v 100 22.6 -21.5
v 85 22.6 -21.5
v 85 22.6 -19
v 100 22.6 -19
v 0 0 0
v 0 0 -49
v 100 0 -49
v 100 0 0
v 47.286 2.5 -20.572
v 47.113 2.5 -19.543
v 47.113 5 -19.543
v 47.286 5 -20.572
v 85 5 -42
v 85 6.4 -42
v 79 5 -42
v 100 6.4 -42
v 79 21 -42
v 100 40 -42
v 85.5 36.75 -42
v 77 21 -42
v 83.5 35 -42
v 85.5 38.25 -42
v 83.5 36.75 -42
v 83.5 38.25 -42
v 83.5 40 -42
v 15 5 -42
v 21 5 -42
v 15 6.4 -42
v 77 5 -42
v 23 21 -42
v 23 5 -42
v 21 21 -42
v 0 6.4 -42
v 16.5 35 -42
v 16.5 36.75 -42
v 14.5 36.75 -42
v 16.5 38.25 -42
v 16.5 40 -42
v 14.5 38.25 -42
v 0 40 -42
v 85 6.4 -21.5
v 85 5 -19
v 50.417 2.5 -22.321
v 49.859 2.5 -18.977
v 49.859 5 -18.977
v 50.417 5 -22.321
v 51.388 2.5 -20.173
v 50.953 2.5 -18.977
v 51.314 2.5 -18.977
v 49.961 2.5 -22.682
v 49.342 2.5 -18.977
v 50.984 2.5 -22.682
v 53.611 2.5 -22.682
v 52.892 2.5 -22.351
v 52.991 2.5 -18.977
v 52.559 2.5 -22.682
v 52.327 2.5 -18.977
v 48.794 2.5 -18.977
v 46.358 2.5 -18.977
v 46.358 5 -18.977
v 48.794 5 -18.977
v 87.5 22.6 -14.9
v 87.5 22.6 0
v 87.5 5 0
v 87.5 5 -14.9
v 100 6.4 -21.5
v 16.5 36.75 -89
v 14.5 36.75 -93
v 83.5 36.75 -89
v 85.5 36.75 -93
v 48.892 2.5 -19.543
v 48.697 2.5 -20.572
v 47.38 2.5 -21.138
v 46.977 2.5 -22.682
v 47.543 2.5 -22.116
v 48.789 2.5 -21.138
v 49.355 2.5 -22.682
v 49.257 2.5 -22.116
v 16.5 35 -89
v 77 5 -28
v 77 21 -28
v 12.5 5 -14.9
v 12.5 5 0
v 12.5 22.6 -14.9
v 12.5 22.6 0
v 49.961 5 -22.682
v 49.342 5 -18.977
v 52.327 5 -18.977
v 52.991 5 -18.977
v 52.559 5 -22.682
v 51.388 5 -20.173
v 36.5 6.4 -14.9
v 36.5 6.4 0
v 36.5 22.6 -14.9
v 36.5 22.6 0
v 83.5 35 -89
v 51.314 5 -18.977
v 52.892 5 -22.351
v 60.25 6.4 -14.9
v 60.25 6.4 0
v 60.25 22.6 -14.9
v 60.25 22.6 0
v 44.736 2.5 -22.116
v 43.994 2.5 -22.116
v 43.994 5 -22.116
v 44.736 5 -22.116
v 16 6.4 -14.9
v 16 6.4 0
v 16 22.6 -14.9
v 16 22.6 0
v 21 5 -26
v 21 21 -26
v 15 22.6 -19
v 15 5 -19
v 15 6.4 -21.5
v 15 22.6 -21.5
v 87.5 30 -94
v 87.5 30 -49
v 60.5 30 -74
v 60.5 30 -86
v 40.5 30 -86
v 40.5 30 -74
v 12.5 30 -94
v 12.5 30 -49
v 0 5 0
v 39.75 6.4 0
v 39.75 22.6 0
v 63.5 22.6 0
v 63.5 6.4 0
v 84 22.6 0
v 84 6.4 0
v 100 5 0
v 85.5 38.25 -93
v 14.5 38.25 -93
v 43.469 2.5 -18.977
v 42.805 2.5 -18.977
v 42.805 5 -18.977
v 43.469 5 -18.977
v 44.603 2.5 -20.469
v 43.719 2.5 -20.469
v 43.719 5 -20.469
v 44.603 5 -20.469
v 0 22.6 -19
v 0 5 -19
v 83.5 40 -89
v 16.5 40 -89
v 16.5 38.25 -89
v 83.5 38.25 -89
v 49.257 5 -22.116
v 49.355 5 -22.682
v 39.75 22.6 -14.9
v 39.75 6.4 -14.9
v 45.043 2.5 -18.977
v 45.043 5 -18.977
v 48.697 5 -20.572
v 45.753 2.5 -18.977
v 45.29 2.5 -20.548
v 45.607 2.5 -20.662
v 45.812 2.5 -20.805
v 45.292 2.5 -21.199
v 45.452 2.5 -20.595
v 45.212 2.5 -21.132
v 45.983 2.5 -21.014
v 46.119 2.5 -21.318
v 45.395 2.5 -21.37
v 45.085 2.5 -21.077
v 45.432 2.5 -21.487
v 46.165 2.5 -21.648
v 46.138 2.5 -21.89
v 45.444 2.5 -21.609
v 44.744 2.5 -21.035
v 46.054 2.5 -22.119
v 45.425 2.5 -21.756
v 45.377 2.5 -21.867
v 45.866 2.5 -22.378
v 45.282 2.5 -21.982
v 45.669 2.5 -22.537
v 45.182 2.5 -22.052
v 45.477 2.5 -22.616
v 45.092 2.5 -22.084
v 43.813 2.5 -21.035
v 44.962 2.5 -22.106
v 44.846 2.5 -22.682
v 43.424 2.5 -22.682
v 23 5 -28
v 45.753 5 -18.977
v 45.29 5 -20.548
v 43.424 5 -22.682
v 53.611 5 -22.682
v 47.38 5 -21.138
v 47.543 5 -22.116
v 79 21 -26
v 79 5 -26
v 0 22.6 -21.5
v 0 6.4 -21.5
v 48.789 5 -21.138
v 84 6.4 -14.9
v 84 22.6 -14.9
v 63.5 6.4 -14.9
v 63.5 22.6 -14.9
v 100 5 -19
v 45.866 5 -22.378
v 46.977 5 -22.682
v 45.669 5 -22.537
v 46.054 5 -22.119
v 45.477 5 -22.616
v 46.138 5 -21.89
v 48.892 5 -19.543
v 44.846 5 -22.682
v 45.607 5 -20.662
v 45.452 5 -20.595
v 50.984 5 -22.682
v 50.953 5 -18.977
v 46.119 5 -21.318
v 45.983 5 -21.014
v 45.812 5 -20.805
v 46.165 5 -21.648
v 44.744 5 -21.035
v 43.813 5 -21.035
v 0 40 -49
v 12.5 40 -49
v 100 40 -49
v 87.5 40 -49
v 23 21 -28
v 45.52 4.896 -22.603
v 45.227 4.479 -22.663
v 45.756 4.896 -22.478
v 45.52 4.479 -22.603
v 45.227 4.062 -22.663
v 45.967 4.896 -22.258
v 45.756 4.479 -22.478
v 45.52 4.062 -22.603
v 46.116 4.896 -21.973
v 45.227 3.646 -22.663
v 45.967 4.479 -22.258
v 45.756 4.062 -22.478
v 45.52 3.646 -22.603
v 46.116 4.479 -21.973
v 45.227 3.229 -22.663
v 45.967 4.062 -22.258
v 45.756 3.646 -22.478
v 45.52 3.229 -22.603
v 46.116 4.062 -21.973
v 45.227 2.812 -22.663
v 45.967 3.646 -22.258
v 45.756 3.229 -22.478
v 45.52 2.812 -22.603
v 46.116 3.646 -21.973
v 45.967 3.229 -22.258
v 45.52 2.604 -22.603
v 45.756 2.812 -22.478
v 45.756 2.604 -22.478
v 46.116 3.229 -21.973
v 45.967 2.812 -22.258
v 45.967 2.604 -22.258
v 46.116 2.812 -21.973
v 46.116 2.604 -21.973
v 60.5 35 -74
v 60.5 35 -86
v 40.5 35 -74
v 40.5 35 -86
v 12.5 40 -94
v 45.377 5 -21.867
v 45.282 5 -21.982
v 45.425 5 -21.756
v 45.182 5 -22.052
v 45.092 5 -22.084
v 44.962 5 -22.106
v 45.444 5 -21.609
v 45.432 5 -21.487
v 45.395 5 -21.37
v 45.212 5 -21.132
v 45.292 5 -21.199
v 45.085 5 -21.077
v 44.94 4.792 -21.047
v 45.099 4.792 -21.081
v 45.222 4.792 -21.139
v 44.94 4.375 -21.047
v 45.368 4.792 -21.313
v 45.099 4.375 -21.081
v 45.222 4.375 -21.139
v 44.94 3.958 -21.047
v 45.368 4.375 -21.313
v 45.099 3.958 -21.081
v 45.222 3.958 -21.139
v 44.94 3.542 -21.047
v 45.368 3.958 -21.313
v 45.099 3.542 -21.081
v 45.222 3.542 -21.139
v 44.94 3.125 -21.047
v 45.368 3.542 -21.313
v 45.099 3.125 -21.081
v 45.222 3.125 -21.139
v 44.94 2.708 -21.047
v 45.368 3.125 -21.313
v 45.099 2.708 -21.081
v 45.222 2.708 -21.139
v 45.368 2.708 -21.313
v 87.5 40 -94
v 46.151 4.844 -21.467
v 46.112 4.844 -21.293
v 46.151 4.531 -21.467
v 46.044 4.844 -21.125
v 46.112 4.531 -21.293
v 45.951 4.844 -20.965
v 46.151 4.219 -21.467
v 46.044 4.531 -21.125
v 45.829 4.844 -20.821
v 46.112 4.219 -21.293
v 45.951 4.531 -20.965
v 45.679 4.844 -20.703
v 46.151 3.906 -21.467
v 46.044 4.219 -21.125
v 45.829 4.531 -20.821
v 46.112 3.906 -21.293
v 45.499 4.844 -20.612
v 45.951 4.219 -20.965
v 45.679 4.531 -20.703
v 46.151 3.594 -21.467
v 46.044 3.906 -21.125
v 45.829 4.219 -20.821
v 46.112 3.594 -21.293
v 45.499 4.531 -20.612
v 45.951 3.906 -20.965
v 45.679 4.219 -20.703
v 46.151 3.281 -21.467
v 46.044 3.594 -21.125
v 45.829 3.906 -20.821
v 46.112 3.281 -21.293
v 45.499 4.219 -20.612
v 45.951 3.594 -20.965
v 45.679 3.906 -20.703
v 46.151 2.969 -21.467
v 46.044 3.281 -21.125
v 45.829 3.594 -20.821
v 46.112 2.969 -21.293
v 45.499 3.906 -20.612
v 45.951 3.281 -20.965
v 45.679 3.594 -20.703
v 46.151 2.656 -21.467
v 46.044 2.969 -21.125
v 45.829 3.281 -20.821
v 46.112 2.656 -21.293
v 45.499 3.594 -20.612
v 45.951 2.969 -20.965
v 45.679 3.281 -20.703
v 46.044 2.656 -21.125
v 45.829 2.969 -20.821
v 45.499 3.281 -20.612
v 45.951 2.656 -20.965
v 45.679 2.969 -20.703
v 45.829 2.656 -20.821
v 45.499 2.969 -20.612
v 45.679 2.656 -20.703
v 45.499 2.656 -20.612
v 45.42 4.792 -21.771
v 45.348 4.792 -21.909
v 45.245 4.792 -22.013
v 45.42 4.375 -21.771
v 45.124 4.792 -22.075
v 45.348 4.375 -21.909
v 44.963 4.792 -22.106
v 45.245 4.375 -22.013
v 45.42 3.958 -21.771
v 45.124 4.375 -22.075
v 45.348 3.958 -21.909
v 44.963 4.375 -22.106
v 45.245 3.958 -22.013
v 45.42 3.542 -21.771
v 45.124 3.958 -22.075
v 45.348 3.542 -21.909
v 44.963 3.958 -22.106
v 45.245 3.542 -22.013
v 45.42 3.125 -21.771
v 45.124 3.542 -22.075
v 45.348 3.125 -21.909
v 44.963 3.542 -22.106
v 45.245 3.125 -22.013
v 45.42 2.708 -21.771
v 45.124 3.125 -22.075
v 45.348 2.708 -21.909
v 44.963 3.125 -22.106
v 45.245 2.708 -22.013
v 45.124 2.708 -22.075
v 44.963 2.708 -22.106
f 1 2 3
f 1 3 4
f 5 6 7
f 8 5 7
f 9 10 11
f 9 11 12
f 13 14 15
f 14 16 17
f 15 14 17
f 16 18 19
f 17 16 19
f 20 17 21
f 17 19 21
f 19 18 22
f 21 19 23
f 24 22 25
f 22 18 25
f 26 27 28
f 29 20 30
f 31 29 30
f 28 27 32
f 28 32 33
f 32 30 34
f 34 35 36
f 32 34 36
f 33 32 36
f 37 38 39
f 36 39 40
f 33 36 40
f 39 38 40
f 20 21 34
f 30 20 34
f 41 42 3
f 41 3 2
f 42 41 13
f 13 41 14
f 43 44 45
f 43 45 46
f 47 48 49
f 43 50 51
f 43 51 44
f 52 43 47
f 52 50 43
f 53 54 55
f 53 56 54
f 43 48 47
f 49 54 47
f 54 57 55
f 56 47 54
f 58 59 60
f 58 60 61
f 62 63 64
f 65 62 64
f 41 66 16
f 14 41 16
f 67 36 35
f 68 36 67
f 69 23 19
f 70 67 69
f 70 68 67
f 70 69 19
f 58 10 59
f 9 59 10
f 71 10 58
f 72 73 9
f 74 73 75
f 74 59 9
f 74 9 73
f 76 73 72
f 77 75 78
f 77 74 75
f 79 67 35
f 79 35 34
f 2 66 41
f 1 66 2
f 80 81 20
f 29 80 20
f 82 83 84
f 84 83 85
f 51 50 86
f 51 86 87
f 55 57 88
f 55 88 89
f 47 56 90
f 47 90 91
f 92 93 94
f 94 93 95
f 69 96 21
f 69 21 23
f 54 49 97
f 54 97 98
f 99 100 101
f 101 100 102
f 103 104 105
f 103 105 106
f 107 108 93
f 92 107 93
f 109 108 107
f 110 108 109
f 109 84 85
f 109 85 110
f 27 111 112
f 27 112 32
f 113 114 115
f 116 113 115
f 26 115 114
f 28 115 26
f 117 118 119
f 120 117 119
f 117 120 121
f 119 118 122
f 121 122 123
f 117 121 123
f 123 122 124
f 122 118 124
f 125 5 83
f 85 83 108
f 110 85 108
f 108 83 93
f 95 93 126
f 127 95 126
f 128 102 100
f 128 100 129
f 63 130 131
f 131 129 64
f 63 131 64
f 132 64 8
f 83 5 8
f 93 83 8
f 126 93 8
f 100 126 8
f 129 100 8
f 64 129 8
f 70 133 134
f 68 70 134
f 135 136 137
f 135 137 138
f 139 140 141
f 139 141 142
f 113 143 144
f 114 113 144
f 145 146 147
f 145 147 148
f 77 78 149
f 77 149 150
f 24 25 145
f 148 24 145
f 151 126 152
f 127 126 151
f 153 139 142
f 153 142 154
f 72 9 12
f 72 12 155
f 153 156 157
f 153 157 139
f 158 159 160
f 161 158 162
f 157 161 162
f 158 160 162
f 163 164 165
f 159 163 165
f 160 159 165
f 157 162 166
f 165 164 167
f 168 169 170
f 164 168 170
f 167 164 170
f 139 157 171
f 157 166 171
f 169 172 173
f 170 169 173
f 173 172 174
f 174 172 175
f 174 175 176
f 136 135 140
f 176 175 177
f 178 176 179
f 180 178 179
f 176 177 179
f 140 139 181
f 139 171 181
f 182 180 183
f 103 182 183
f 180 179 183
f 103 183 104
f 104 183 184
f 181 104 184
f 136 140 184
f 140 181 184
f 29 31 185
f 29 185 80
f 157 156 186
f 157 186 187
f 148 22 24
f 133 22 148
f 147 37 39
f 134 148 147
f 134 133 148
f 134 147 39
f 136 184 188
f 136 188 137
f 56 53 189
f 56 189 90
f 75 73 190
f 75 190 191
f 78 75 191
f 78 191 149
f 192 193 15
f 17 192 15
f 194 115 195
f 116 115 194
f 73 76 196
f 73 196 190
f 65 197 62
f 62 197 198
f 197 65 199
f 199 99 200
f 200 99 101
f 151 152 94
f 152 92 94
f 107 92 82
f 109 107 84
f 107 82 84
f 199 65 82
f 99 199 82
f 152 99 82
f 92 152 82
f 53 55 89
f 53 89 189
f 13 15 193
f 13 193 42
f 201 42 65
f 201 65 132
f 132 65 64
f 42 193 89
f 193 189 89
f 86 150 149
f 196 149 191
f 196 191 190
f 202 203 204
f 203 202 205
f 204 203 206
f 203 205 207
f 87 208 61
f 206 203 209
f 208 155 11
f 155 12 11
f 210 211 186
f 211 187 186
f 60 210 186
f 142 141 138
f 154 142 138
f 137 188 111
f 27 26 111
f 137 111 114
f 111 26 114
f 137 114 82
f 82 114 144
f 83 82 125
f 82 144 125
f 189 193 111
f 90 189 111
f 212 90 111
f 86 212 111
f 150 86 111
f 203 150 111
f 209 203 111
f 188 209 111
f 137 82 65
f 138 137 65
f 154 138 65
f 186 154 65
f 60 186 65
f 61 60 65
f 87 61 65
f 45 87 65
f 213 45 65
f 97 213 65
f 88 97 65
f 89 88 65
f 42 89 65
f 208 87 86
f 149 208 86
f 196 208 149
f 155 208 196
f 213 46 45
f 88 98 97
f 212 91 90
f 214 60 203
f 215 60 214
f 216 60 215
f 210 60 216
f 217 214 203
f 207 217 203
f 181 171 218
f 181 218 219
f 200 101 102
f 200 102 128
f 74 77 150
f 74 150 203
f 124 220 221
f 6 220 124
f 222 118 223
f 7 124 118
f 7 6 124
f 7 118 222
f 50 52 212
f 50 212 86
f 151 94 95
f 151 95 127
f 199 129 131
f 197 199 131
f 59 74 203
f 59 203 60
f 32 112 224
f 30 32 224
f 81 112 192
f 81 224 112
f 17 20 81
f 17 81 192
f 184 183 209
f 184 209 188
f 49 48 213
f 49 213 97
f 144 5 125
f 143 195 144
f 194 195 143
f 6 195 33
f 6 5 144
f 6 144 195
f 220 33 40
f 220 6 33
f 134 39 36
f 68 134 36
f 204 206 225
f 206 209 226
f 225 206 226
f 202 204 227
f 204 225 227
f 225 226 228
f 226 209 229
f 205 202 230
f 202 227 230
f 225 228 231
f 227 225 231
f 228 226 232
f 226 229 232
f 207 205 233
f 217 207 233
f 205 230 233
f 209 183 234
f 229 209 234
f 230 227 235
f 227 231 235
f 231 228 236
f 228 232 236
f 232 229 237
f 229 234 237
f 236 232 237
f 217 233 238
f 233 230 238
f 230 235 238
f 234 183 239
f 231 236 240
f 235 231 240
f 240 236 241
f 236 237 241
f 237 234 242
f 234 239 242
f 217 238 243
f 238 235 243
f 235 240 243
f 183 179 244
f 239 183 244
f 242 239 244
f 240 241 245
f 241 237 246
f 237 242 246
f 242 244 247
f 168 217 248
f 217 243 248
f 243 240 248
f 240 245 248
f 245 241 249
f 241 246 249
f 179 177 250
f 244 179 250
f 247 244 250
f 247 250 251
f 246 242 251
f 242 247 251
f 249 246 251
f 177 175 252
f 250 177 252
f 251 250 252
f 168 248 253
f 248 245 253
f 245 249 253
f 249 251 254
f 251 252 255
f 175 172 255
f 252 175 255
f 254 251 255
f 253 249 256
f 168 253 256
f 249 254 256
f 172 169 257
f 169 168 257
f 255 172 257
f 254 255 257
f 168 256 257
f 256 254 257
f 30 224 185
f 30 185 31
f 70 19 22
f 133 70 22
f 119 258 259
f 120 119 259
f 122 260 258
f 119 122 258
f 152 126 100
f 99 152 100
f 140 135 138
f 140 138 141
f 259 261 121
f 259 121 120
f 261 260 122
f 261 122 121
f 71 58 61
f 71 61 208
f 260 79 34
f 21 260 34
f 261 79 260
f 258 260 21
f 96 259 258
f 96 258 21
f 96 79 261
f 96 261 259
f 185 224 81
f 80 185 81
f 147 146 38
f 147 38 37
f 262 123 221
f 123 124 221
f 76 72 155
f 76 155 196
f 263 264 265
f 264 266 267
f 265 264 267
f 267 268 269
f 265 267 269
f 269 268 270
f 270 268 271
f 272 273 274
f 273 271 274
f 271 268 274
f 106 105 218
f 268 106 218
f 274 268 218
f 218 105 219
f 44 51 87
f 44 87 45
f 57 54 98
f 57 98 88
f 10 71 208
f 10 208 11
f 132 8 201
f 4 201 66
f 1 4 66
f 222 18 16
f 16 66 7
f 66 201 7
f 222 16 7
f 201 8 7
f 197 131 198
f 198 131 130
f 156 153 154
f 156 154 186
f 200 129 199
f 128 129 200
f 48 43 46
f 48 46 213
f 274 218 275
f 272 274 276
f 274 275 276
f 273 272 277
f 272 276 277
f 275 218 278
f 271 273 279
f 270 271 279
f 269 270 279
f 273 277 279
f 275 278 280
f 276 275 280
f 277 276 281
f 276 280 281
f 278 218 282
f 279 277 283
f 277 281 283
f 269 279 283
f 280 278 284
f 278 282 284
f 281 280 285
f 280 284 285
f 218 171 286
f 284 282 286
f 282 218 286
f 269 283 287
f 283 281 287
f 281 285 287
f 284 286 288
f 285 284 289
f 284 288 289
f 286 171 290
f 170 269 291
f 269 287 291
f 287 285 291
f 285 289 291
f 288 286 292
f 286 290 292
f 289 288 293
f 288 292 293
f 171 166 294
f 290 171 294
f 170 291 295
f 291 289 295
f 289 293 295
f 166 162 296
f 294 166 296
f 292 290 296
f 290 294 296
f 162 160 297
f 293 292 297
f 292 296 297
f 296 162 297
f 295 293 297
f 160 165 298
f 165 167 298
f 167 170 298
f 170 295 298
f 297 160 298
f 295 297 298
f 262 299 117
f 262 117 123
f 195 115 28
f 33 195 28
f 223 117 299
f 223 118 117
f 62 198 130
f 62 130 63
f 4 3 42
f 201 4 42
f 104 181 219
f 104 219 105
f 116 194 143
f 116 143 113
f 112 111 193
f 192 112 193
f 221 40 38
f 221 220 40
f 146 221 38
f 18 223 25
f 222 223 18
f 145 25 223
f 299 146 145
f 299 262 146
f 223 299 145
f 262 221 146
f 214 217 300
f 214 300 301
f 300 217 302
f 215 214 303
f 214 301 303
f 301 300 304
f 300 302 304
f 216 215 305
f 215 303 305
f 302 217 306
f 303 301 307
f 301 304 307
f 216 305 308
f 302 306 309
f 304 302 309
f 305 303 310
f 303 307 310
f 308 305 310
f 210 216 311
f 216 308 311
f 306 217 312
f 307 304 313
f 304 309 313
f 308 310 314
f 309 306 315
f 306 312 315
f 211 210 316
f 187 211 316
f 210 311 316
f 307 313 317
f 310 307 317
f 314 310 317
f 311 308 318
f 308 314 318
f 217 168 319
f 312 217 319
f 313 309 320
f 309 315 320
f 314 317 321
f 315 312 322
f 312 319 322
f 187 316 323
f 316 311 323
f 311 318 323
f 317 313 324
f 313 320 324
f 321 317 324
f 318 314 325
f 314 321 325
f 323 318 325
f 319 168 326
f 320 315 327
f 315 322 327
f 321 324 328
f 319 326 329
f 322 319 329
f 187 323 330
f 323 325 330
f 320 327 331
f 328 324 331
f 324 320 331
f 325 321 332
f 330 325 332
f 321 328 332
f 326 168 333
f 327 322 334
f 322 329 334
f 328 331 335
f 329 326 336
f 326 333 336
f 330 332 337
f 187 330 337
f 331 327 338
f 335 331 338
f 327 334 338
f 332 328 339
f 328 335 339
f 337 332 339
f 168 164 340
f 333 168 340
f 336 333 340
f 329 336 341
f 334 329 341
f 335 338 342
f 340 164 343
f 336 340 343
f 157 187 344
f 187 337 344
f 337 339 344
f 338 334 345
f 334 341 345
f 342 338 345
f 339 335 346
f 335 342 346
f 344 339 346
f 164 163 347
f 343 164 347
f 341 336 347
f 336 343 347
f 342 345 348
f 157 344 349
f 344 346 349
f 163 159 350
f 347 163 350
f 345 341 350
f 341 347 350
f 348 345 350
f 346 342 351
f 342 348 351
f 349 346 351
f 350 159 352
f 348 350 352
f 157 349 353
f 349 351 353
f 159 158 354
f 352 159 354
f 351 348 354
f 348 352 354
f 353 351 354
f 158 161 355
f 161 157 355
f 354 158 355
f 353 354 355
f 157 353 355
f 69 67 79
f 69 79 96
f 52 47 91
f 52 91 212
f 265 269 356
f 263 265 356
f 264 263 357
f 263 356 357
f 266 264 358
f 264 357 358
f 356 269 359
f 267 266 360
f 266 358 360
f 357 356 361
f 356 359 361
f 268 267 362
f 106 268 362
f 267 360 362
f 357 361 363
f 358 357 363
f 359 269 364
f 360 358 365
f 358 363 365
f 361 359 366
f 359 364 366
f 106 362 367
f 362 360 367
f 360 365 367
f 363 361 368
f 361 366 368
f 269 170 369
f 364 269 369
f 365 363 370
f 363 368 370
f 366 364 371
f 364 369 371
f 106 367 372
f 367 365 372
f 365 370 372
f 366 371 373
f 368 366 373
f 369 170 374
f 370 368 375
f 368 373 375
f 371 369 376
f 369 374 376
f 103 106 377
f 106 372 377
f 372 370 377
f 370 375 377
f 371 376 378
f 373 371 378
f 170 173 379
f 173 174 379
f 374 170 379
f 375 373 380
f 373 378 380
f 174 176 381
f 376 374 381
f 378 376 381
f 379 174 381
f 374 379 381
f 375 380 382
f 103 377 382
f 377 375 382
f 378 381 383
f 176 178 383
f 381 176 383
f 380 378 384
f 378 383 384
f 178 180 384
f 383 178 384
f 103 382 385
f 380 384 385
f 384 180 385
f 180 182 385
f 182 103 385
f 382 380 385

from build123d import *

# Parameters (mm, degrees)
CROQUIS1_W              = 100
CROQUIS1_H              = 49
SALIENTE_EXTRUIR1_DEPTH = 40
CROQUIS2_W              = 70
CROQUIS2_H              = 29
CORTAR_EXTRUIR1_DEPTH   = 35
CORTAR_EXTRUIR2_DEPTH   = 14.9
CORTAR_EXTRUIR4_DEPTH   = 119.325821358
CROQUIS6_W              = 20.5
CROQUIS6_H              = 16.2
CORTAR_EXTRUIR6_DEPTH   = 119.325821358
CROQUIS7_W              = 58
CROQUIS7_H              = 18
SALIENTE_EXTRUIR2_DEPTH = 16
CROQUIS8_W              = 54
CROQUIS8_H              = 14
CORTAR_EXTRUIR7_DEPTH   = 16
ENVOLVER2_START         = -2.5
ENVOLVER2_DEPTH         = 2.5
CROQUIS11_W             = 75
CROQUIS11_H             = 10
SALIENTE_EXTRUIR3_DEPTH = 44
CROQUIS12_W             = 67
CROQUIS12_H             = 45
CORTAR_EXTRUIR8_DEPTH   = 5
CROQUIS13_W             = 71
CROQUIS13_H             = 1.5
CORTAR_EXTRUIR9_DEPTH   = 54
CROQUIS14_W             = 20
CROQUIS14_H             = 12
CORTAR_EXTRUIR10_DEPTH  = 5
CORTAR_EXTRUIR11_REACH  = 144.299
CROQUIS5_W              = 20.5
CROQUIS5_H              = 16.2
CROQUIS15_W             = 75
CROQUIS15_H             = 10
SALIENTE_EXTRUIR4_DEPTH = 1
CROQUIS16_W             = 75
CROQUIS16_H             = 14.9
CROQUIS16_W_2           = 15
CROQUIS16_H_2           = 25
CORTAR_EXTRUIR12_DEPTH  = 2.4
SALIENTE_EXTRUIR5_DEPTH = 2


# Read off the part's stored shape, not the designer's step: Envolver2
with BuildPart() as part:
    # Croquis1 → Saliente-Extruir1 (new body)
    with BuildSketch(Plane(origin=(0, 0, 0), x_dir=(1, 0, 0), z_dir=(0, 1, 0))):
        with Locations((50, 24.5)):
            Rectangle(CROQUIS1_W, CROQUIS1_H)
    extrude(amount=SALIENTE_EXTRUIR1_DEPTH)

    # Croquis2 → Cortar-Extruir1 (cut)
    with BuildSketch(Plane(origin=(0, 40, 0), x_dir=(1, 0, 0), z_dir=(0, 1, 0))):
        with Locations((50, 29.5)):
            Rectangle(CROQUIS2_W, CROQUIS2_H)
    extrude(amount=-CORTAR_EXTRUIR1_DEPTH, mode=Mode.SUBTRACT)

    # Croquis3 → Cortar-Extruir2 (cut)
    with BuildSketch(Plane.XY):
        Polygon((12.5, 5), (12.5, 25), (87.5, 25), (87.5, 5), (100, 5), (100, 40), (0, 40), (0, 5), align=None)
    extrude(amount=-CORTAR_EXTRUIR2_DEPTH, mode=Mode.SUBTRACT)

    # Croquis4 → Cortar-Extruir4 (cut, through all)
    with BuildSketch(Plane.ZY):
        Polygon((-44, 25), (-19, 25), (-19, 5), (-14.9, 5), (-14.9, 40), (-44, 40), align=None)
    extrude(amount=-CORTAR_EXTRUIR4_DEPTH, mode=Mode.SUBTRACT)

    # Croquis6 → Cortar-Extruir6 (cut, through all)
    with BuildSketch(Plane(origin=(100, 0, 0), x_dir=(0, 0, -1), z_dir=(1, 0, 0))):
        with Locations((31.75, 14.5)):
            Rectangle(CROQUIS6_W, CROQUIS6_H)
    extrude(amount=-CORTAR_EXTRUIR6_DEPTH, mode=Mode.SUBTRACT)

    # Croquis7 → Saliente-Extruir2 (add)
    with BuildSketch(Plane(origin=(0, 5, 0), x_dir=(1, 0, 0), z_dir=(0, 1, 0))):
        with Locations((50, 35)):
            Rectangle(CROQUIS7_W, CROQUIS7_H)
    extrude(amount=SALIENTE_EXTRUIR2_DEPTH)

    # Croquis8 → Cortar-Extruir7 (cut)
    with BuildSketch(Plane(origin=(0, 21, 0), x_dir=(1, 0, 0), z_dir=(0, 1, 0))):
        with Locations((50, 35)):
            Rectangle(CROQUIS8_W, CROQUIS8_H)
    extrude(amount=-CORTAR_EXTRUIR7_DEPTH, mode=Mode.SUBTRACT)

    # Envolver2 outline → Envolver2 (cut)
    # profile 1 of 3: a face of its own
    with BuildSketch(Plane(origin=(0, 5, 0), x_dir=(1, 0, 0), z_dir=(0, 1, 0)).offset(ENVOLVER2_START)):
        with BuildLine():
            add(Edge.make_bspline(
                [(44.845927513, 22.682039813), (44.880502524, 22.681581101), (44.94779002, 22.680688388), (45.045978034, 22.678103561), (45.138406194, 22.671034857), (45.225422346, 22.663758255), (45.306894242, 22.652117669), (45.382891805, 22.638865253), (45.453428219, 22.622573117), (45.519399834, 22.604194379), (45.582065701, 22.58175166), (45.642294727, 22.553081251), (45.700763218, 22.518735345), (45.757273689, 22.477750733), (45.813128977, 22.432374893), (45.865885411, 22.37921084), (45.918377238, 22.321807714), (45.967578278, 22.25830401), (46.01447324, 22.191680732), (46.054376208, 22.120908747), (46.088223994, 22.047966819), (46.117214563, 21.973058038), (46.136979973, 21.894799291), (46.154181469, 21.814812457), (46.162464556, 21.732060085), (46.163897144, 21.676148523), (46.164618555, 21.647993057)],
                knots=[0, 0, 0, 0, 0.054369818, 0.105810783, 0.1543913, 0.200099433, 0.243069893, 0.283740822, 0.321360744, 0.356845277, 0.391373506, 0.42587086, 0.461574928, 0.497826917, 0.535543491, 0.574581255, 0.615459073, 0.657779879, 0.700797841, 0.743450957, 0.785305491, 0.827181235, 0.869502041, 0.912065543, 0.955718718, 1, 1, 1, 1], degree=3))
            Line((44.845927513, 22.682039813), (43.424314244, 22.682039813))
            Line((43.424314244, 22.682039813), (42.805172718, 18.976839617))
            Line((42.805172718, 18.976839617), (43.469342719, 18.976839617))
            Line((43.469342719, 18.976839617), (43.718607489, 20.469211918))
            Line((43.718607489, 20.469211918), (44.603095383, 20.469211918))
            Line((44.603095383, 20.469211918), (45.04292709, 18.976839617))
            Line((45.04292709, 18.976839617), (45.752929645, 18.976839617))
            Line((45.752929645, 18.976839617), (45.28977962, 20.548011749))
            add(Edge.make_bspline(
                [(46.164618555, 21.647993057), (46.164091676, 21.617670303), (46.163039403, 21.5571103), (46.151744736, 21.467468845), (46.13622668, 21.379126232), (46.112503265, 21.292592771), (46.082048693, 21.207680933), (46.044780457, 21.124441143), (46.001130757, 21.043108672), (45.951712013, 20.9635574), (45.895224481, 20.887990565), (45.830214645, 20.819272615), (45.758276279, 20.757071565), (45.678885267, 20.701205138), (45.592072867, 20.652370985), (45.497799172, 20.610367641), (45.396617343, 20.574987864), (45.325850603, 20.557119534), (45.28977962, 20.548011749)],
                knots=[0, 0, 0, 0, 0.059520551, 0.118873267, 0.177208837, 0.235565778, 0.294841411, 0.354222133, 0.414510544, 0.476000381, 0.538010758, 0.599455515, 0.661405537, 0.724496825, 0.78978963, 0.856706752, 0.926961053, 1, 1, 1, 1], degree=3))
        make_face()
        with BuildLine():
            add(Edge.make_bspline(
                [(44.743809366, 21.03528417), (44.778129381, 21.03600119), (44.843652036, 21.0373701), (44.937526666, 21.044910102), (45.022020151, 21.059216882), (45.097465695, 21.079213334), (45.164300411, 21.104537257), (45.221481868, 21.136836672), (45.270624581, 21.17399479), (45.32077283, 21.232312946), (45.36864261, 21.310567266), (45.413007527, 21.407196099), (45.438530205, 21.507321555), (45.442292151, 21.574957755), (45.444162962, 21.608593141)],
                knots=[0, 0, 0, 0, 0.099664188, 0.190275618, 0.273183536, 0.348129931, 0.416633313, 0.480054439, 0.538277477, 0.594505454, 0.702244126, 0.80362549, 0.902343236, 1, 1, 1, 1], degree=3))
            Line((44.743809366, 21.03528417), (43.812684837, 21.03528417))
            Line((43.812684837, 21.03528417), (43.993602816, 22.115967561))
            Line((43.993602816, 22.115967561), (44.735768567, 22.115967561))
            add(Edge.make_bspline(
                [(45.444162962, 21.608593141), (45.443321191, 21.636863214), (45.441681994, 21.691914124), (45.421908744, 21.770970842), (45.392768442, 21.844328967), (45.35019923, 21.909220717), (45.300609579, 21.965653441), (45.246923641, 22.013950522), (45.187891151, 22.050903022), (45.122329195, 22.077622199), (45.046506806, 22.09459194), (44.957252302, 22.107151834), (44.85196106, 22.115045121), (44.776255138, 22.115646142), (44.735768567, 22.115967561)],
                knots=[0, 0, 0, 0, 0.084973229, 0.165470167, 0.24404472, 0.32176826, 0.397881214, 0.469968558, 0.538528016, 0.606605512, 0.682202732, 0.771959831, 0.878046995, 1, 1, 1, 1], degree=3))
        make_face(mode=Mode.SUBTRACT)
    # profile 2 of 3: a face of its own
    with BuildSketch(Plane(origin=(0, 5, 0), x_dir=(1, 0, 0), z_dir=(0, 1, 0)).offset(ENVOLVER2_START)):
        Polygon((46.976739258, 22.682039813), (46.357597732, 18.976839617), (48.79395984, 18.976839617), (48.892057588, 19.542911869), (47.113432841, 19.542911869), (47.285505941, 20.572134146), (48.696666171, 20.572134146), (48.78913536, 21.138206398), (47.379583289, 21.138206398), (47.54281151, 22.115967561), (49.257109864, 22.115967561), (49.355207612, 22.682039813), align=None)
    # profile 3 of 3: a face of its own
    with BuildSketch(Plane(origin=(0, 5, 0), x_dir=(1, 0, 0), z_dir=(0, 1, 0)).offset(ENVOLVER2_START)):
        Polygon((50.984273497, 22.682039813), (49.96148386, 22.682039813), (49.342342334, 18.976839617), (49.858561632, 18.976839617), (50.417397165, 22.321007936), (50.952914381, 18.976839617), (51.313946257, 18.976839617), (52.891551028, 22.350758892), (52.327086936, 18.976839617), (52.991256936, 18.976839617), (53.611202541, 22.682039813), (52.559466028, 22.682039813), (51.387921608, 20.172506434), align=None)
    extrude(amount=ENVOLVER2_DEPTH, mode=Mode.SUBTRACT)

    # Croquis11 → Saliente-Extruir3 (add)
    with BuildSketch(Plane(origin=(0, 0, -49), x_dir=(-1, 0, 0), z_dir=(0, 0, -1))):
        with Locations((-50, 35)):
            Rectangle(CROQUIS11_W, CROQUIS11_H)
    extrude(amount=SALIENTE_EXTRUIR3_DEPTH)

    # Croquis12 → Cortar-Extruir8 (cut)
    with BuildSketch(Plane(origin=(0, 40, 0), x_dir=(1, 0, 0), z_dir=(0, 1, 0))):
        with Locations((50, 66.5)):
            Rectangle(CROQUIS12_W, CROQUIS12_H)
    extrude(amount=-CORTAR_EXTRUIR8_DEPTH, mode=Mode.SUBTRACT)

    # Croquis13 → Cortar-Extruir9 (cut)
    with BuildSketch(Plane.XY.offset(-44)):
        with Locations((50, 37.5)):
            Rectangle(CROQUIS13_W, CROQUIS13_H)
    extrude(amount=-CORTAR_EXTRUIR9_DEPTH, mode=Mode.SUBTRACT)

    # Croquis14 → Cortar-Extruir10 (cut)
    with BuildSketch(Plane(origin=(0, 35, 0), x_dir=(1, 0, 0), z_dir=(0, 1, 0))):
        with Locations((50.5, 80)):
            Rectangle(CROQUIS14_W, CROQUIS14_H)
    extrude(amount=-CORTAR_EXTRUIR10_DEPTH, mode=Mode.SUBTRACT)

    # Croquis5 → Cortar-Extruir11 (cut, up to next)
    with BuildSketch(Plane.XY, mode=Mode.PRIVATE) as cortar_extruir11_sk1:
        with Locations((26.25, 14.5)):
            Rectangle(CROQUIS5_W, CROQUIS5_H)
    cortar_extruir11_tool1 = extrude(cortar_extruir11_sk1.sketch, amount=-CORTAR_EXTRUIR11_REACH, mode=Mode.PRIVATE) & part.part
    # Croquis5 → Cortar-Extruir11 (cut, up to next)
    with BuildSketch(Plane.XY, mode=Mode.PRIVATE) as cortar_extruir11_sk2:
        with Locations((50, 14.5)):
            Rectangle(CROQUIS5_W, CROQUIS5_H)
    cortar_extruir11_tool2 = extrude(cortar_extruir11_sk2.sketch, amount=-CORTAR_EXTRUIR11_REACH, mode=Mode.PRIVATE) & part.part
    # Croquis5 → Cortar-Extruir11 (cut, up to next)
    with BuildSketch(Plane.XY, mode=Mode.PRIVATE) as cortar_extruir11_sk3:
        with Locations((73.75, 14.5)):
            Rectangle(CROQUIS5_W, CROQUIS5_H)
    cortar_extruir11_tool3 = extrude(cortar_extruir11_sk3.sketch, amount=-CORTAR_EXTRUIR11_REACH, mode=Mode.PRIVATE) & part.part
    add(cortar_extruir11_tool1.solids().sort_by_distance((26.25, 14.5, 0))[0], mode=Mode.SUBTRACT)
    add(cortar_extruir11_tool2.solids().sort_by_distance((50, 14.5, 0))[0], mode=Mode.SUBTRACT)
    add(cortar_extruir11_tool3.solids().sort_by_distance((73.75, 14.5, 0))[0], mode=Mode.SUBTRACT)

    # Croquis15 → Saliente-Extruir4 (add)
    with BuildSketch(Plane(origin=(0, 0, -93), x_dir=(-1, 0, 0), z_dir=(0, 0, -1))):
        with Locations((-50, 35)):
            Rectangle(CROQUIS15_W, CROQUIS15_H)
    extrude(amount=SALIENTE_EXTRUIR4_DEPTH)

    # Croquis16 → Cortar-Extruir12 (cut)
    with BuildSketch(Plane(origin=(0, 25, 0), x_dir=(1, 0, 0), z_dir=(0, 1, 0))):
        with Locations((50, 7.45)):
            Rectangle(CROQUIS16_W, CROQUIS16_H)
        with Locations((7.5, 31.5)):
            Rectangle(CROQUIS16_W_2, CROQUIS16_H_2)
        with Locations((92.5, 31.5)):
            Rectangle(CROQUIS16_W_2, CROQUIS16_H_2)
    extrude(amount=-CORTAR_EXTRUIR12_DEPTH, mode=Mode.SUBTRACT)

    # Croquis17 → Saliente-Extruir5 (add)
    with BuildSketch(Plane.XY.offset(-44)):
        Polygon((0, 40), (16.5, 40), (16.5, 38.25), (14.5, 38.25), (14.5, 36.75), (16.5, 36.75), (16.5, 35), (83.5, 35), (83.5, 36.75), (85.5, 36.75), (85.5, 38.25), (83.5, 38.25), (83.5, 40), (100, 40), (100, 22.6), (85, 22.6), (85, 5), (79, 5), (79, 21), (21, 21), (21, 5), (15, 5), (15, 22.6), (0, 22.6), align=None)
    extrude(amount=SALIENTE_EXTRUIR5_DEPTH)


solid = part.part
